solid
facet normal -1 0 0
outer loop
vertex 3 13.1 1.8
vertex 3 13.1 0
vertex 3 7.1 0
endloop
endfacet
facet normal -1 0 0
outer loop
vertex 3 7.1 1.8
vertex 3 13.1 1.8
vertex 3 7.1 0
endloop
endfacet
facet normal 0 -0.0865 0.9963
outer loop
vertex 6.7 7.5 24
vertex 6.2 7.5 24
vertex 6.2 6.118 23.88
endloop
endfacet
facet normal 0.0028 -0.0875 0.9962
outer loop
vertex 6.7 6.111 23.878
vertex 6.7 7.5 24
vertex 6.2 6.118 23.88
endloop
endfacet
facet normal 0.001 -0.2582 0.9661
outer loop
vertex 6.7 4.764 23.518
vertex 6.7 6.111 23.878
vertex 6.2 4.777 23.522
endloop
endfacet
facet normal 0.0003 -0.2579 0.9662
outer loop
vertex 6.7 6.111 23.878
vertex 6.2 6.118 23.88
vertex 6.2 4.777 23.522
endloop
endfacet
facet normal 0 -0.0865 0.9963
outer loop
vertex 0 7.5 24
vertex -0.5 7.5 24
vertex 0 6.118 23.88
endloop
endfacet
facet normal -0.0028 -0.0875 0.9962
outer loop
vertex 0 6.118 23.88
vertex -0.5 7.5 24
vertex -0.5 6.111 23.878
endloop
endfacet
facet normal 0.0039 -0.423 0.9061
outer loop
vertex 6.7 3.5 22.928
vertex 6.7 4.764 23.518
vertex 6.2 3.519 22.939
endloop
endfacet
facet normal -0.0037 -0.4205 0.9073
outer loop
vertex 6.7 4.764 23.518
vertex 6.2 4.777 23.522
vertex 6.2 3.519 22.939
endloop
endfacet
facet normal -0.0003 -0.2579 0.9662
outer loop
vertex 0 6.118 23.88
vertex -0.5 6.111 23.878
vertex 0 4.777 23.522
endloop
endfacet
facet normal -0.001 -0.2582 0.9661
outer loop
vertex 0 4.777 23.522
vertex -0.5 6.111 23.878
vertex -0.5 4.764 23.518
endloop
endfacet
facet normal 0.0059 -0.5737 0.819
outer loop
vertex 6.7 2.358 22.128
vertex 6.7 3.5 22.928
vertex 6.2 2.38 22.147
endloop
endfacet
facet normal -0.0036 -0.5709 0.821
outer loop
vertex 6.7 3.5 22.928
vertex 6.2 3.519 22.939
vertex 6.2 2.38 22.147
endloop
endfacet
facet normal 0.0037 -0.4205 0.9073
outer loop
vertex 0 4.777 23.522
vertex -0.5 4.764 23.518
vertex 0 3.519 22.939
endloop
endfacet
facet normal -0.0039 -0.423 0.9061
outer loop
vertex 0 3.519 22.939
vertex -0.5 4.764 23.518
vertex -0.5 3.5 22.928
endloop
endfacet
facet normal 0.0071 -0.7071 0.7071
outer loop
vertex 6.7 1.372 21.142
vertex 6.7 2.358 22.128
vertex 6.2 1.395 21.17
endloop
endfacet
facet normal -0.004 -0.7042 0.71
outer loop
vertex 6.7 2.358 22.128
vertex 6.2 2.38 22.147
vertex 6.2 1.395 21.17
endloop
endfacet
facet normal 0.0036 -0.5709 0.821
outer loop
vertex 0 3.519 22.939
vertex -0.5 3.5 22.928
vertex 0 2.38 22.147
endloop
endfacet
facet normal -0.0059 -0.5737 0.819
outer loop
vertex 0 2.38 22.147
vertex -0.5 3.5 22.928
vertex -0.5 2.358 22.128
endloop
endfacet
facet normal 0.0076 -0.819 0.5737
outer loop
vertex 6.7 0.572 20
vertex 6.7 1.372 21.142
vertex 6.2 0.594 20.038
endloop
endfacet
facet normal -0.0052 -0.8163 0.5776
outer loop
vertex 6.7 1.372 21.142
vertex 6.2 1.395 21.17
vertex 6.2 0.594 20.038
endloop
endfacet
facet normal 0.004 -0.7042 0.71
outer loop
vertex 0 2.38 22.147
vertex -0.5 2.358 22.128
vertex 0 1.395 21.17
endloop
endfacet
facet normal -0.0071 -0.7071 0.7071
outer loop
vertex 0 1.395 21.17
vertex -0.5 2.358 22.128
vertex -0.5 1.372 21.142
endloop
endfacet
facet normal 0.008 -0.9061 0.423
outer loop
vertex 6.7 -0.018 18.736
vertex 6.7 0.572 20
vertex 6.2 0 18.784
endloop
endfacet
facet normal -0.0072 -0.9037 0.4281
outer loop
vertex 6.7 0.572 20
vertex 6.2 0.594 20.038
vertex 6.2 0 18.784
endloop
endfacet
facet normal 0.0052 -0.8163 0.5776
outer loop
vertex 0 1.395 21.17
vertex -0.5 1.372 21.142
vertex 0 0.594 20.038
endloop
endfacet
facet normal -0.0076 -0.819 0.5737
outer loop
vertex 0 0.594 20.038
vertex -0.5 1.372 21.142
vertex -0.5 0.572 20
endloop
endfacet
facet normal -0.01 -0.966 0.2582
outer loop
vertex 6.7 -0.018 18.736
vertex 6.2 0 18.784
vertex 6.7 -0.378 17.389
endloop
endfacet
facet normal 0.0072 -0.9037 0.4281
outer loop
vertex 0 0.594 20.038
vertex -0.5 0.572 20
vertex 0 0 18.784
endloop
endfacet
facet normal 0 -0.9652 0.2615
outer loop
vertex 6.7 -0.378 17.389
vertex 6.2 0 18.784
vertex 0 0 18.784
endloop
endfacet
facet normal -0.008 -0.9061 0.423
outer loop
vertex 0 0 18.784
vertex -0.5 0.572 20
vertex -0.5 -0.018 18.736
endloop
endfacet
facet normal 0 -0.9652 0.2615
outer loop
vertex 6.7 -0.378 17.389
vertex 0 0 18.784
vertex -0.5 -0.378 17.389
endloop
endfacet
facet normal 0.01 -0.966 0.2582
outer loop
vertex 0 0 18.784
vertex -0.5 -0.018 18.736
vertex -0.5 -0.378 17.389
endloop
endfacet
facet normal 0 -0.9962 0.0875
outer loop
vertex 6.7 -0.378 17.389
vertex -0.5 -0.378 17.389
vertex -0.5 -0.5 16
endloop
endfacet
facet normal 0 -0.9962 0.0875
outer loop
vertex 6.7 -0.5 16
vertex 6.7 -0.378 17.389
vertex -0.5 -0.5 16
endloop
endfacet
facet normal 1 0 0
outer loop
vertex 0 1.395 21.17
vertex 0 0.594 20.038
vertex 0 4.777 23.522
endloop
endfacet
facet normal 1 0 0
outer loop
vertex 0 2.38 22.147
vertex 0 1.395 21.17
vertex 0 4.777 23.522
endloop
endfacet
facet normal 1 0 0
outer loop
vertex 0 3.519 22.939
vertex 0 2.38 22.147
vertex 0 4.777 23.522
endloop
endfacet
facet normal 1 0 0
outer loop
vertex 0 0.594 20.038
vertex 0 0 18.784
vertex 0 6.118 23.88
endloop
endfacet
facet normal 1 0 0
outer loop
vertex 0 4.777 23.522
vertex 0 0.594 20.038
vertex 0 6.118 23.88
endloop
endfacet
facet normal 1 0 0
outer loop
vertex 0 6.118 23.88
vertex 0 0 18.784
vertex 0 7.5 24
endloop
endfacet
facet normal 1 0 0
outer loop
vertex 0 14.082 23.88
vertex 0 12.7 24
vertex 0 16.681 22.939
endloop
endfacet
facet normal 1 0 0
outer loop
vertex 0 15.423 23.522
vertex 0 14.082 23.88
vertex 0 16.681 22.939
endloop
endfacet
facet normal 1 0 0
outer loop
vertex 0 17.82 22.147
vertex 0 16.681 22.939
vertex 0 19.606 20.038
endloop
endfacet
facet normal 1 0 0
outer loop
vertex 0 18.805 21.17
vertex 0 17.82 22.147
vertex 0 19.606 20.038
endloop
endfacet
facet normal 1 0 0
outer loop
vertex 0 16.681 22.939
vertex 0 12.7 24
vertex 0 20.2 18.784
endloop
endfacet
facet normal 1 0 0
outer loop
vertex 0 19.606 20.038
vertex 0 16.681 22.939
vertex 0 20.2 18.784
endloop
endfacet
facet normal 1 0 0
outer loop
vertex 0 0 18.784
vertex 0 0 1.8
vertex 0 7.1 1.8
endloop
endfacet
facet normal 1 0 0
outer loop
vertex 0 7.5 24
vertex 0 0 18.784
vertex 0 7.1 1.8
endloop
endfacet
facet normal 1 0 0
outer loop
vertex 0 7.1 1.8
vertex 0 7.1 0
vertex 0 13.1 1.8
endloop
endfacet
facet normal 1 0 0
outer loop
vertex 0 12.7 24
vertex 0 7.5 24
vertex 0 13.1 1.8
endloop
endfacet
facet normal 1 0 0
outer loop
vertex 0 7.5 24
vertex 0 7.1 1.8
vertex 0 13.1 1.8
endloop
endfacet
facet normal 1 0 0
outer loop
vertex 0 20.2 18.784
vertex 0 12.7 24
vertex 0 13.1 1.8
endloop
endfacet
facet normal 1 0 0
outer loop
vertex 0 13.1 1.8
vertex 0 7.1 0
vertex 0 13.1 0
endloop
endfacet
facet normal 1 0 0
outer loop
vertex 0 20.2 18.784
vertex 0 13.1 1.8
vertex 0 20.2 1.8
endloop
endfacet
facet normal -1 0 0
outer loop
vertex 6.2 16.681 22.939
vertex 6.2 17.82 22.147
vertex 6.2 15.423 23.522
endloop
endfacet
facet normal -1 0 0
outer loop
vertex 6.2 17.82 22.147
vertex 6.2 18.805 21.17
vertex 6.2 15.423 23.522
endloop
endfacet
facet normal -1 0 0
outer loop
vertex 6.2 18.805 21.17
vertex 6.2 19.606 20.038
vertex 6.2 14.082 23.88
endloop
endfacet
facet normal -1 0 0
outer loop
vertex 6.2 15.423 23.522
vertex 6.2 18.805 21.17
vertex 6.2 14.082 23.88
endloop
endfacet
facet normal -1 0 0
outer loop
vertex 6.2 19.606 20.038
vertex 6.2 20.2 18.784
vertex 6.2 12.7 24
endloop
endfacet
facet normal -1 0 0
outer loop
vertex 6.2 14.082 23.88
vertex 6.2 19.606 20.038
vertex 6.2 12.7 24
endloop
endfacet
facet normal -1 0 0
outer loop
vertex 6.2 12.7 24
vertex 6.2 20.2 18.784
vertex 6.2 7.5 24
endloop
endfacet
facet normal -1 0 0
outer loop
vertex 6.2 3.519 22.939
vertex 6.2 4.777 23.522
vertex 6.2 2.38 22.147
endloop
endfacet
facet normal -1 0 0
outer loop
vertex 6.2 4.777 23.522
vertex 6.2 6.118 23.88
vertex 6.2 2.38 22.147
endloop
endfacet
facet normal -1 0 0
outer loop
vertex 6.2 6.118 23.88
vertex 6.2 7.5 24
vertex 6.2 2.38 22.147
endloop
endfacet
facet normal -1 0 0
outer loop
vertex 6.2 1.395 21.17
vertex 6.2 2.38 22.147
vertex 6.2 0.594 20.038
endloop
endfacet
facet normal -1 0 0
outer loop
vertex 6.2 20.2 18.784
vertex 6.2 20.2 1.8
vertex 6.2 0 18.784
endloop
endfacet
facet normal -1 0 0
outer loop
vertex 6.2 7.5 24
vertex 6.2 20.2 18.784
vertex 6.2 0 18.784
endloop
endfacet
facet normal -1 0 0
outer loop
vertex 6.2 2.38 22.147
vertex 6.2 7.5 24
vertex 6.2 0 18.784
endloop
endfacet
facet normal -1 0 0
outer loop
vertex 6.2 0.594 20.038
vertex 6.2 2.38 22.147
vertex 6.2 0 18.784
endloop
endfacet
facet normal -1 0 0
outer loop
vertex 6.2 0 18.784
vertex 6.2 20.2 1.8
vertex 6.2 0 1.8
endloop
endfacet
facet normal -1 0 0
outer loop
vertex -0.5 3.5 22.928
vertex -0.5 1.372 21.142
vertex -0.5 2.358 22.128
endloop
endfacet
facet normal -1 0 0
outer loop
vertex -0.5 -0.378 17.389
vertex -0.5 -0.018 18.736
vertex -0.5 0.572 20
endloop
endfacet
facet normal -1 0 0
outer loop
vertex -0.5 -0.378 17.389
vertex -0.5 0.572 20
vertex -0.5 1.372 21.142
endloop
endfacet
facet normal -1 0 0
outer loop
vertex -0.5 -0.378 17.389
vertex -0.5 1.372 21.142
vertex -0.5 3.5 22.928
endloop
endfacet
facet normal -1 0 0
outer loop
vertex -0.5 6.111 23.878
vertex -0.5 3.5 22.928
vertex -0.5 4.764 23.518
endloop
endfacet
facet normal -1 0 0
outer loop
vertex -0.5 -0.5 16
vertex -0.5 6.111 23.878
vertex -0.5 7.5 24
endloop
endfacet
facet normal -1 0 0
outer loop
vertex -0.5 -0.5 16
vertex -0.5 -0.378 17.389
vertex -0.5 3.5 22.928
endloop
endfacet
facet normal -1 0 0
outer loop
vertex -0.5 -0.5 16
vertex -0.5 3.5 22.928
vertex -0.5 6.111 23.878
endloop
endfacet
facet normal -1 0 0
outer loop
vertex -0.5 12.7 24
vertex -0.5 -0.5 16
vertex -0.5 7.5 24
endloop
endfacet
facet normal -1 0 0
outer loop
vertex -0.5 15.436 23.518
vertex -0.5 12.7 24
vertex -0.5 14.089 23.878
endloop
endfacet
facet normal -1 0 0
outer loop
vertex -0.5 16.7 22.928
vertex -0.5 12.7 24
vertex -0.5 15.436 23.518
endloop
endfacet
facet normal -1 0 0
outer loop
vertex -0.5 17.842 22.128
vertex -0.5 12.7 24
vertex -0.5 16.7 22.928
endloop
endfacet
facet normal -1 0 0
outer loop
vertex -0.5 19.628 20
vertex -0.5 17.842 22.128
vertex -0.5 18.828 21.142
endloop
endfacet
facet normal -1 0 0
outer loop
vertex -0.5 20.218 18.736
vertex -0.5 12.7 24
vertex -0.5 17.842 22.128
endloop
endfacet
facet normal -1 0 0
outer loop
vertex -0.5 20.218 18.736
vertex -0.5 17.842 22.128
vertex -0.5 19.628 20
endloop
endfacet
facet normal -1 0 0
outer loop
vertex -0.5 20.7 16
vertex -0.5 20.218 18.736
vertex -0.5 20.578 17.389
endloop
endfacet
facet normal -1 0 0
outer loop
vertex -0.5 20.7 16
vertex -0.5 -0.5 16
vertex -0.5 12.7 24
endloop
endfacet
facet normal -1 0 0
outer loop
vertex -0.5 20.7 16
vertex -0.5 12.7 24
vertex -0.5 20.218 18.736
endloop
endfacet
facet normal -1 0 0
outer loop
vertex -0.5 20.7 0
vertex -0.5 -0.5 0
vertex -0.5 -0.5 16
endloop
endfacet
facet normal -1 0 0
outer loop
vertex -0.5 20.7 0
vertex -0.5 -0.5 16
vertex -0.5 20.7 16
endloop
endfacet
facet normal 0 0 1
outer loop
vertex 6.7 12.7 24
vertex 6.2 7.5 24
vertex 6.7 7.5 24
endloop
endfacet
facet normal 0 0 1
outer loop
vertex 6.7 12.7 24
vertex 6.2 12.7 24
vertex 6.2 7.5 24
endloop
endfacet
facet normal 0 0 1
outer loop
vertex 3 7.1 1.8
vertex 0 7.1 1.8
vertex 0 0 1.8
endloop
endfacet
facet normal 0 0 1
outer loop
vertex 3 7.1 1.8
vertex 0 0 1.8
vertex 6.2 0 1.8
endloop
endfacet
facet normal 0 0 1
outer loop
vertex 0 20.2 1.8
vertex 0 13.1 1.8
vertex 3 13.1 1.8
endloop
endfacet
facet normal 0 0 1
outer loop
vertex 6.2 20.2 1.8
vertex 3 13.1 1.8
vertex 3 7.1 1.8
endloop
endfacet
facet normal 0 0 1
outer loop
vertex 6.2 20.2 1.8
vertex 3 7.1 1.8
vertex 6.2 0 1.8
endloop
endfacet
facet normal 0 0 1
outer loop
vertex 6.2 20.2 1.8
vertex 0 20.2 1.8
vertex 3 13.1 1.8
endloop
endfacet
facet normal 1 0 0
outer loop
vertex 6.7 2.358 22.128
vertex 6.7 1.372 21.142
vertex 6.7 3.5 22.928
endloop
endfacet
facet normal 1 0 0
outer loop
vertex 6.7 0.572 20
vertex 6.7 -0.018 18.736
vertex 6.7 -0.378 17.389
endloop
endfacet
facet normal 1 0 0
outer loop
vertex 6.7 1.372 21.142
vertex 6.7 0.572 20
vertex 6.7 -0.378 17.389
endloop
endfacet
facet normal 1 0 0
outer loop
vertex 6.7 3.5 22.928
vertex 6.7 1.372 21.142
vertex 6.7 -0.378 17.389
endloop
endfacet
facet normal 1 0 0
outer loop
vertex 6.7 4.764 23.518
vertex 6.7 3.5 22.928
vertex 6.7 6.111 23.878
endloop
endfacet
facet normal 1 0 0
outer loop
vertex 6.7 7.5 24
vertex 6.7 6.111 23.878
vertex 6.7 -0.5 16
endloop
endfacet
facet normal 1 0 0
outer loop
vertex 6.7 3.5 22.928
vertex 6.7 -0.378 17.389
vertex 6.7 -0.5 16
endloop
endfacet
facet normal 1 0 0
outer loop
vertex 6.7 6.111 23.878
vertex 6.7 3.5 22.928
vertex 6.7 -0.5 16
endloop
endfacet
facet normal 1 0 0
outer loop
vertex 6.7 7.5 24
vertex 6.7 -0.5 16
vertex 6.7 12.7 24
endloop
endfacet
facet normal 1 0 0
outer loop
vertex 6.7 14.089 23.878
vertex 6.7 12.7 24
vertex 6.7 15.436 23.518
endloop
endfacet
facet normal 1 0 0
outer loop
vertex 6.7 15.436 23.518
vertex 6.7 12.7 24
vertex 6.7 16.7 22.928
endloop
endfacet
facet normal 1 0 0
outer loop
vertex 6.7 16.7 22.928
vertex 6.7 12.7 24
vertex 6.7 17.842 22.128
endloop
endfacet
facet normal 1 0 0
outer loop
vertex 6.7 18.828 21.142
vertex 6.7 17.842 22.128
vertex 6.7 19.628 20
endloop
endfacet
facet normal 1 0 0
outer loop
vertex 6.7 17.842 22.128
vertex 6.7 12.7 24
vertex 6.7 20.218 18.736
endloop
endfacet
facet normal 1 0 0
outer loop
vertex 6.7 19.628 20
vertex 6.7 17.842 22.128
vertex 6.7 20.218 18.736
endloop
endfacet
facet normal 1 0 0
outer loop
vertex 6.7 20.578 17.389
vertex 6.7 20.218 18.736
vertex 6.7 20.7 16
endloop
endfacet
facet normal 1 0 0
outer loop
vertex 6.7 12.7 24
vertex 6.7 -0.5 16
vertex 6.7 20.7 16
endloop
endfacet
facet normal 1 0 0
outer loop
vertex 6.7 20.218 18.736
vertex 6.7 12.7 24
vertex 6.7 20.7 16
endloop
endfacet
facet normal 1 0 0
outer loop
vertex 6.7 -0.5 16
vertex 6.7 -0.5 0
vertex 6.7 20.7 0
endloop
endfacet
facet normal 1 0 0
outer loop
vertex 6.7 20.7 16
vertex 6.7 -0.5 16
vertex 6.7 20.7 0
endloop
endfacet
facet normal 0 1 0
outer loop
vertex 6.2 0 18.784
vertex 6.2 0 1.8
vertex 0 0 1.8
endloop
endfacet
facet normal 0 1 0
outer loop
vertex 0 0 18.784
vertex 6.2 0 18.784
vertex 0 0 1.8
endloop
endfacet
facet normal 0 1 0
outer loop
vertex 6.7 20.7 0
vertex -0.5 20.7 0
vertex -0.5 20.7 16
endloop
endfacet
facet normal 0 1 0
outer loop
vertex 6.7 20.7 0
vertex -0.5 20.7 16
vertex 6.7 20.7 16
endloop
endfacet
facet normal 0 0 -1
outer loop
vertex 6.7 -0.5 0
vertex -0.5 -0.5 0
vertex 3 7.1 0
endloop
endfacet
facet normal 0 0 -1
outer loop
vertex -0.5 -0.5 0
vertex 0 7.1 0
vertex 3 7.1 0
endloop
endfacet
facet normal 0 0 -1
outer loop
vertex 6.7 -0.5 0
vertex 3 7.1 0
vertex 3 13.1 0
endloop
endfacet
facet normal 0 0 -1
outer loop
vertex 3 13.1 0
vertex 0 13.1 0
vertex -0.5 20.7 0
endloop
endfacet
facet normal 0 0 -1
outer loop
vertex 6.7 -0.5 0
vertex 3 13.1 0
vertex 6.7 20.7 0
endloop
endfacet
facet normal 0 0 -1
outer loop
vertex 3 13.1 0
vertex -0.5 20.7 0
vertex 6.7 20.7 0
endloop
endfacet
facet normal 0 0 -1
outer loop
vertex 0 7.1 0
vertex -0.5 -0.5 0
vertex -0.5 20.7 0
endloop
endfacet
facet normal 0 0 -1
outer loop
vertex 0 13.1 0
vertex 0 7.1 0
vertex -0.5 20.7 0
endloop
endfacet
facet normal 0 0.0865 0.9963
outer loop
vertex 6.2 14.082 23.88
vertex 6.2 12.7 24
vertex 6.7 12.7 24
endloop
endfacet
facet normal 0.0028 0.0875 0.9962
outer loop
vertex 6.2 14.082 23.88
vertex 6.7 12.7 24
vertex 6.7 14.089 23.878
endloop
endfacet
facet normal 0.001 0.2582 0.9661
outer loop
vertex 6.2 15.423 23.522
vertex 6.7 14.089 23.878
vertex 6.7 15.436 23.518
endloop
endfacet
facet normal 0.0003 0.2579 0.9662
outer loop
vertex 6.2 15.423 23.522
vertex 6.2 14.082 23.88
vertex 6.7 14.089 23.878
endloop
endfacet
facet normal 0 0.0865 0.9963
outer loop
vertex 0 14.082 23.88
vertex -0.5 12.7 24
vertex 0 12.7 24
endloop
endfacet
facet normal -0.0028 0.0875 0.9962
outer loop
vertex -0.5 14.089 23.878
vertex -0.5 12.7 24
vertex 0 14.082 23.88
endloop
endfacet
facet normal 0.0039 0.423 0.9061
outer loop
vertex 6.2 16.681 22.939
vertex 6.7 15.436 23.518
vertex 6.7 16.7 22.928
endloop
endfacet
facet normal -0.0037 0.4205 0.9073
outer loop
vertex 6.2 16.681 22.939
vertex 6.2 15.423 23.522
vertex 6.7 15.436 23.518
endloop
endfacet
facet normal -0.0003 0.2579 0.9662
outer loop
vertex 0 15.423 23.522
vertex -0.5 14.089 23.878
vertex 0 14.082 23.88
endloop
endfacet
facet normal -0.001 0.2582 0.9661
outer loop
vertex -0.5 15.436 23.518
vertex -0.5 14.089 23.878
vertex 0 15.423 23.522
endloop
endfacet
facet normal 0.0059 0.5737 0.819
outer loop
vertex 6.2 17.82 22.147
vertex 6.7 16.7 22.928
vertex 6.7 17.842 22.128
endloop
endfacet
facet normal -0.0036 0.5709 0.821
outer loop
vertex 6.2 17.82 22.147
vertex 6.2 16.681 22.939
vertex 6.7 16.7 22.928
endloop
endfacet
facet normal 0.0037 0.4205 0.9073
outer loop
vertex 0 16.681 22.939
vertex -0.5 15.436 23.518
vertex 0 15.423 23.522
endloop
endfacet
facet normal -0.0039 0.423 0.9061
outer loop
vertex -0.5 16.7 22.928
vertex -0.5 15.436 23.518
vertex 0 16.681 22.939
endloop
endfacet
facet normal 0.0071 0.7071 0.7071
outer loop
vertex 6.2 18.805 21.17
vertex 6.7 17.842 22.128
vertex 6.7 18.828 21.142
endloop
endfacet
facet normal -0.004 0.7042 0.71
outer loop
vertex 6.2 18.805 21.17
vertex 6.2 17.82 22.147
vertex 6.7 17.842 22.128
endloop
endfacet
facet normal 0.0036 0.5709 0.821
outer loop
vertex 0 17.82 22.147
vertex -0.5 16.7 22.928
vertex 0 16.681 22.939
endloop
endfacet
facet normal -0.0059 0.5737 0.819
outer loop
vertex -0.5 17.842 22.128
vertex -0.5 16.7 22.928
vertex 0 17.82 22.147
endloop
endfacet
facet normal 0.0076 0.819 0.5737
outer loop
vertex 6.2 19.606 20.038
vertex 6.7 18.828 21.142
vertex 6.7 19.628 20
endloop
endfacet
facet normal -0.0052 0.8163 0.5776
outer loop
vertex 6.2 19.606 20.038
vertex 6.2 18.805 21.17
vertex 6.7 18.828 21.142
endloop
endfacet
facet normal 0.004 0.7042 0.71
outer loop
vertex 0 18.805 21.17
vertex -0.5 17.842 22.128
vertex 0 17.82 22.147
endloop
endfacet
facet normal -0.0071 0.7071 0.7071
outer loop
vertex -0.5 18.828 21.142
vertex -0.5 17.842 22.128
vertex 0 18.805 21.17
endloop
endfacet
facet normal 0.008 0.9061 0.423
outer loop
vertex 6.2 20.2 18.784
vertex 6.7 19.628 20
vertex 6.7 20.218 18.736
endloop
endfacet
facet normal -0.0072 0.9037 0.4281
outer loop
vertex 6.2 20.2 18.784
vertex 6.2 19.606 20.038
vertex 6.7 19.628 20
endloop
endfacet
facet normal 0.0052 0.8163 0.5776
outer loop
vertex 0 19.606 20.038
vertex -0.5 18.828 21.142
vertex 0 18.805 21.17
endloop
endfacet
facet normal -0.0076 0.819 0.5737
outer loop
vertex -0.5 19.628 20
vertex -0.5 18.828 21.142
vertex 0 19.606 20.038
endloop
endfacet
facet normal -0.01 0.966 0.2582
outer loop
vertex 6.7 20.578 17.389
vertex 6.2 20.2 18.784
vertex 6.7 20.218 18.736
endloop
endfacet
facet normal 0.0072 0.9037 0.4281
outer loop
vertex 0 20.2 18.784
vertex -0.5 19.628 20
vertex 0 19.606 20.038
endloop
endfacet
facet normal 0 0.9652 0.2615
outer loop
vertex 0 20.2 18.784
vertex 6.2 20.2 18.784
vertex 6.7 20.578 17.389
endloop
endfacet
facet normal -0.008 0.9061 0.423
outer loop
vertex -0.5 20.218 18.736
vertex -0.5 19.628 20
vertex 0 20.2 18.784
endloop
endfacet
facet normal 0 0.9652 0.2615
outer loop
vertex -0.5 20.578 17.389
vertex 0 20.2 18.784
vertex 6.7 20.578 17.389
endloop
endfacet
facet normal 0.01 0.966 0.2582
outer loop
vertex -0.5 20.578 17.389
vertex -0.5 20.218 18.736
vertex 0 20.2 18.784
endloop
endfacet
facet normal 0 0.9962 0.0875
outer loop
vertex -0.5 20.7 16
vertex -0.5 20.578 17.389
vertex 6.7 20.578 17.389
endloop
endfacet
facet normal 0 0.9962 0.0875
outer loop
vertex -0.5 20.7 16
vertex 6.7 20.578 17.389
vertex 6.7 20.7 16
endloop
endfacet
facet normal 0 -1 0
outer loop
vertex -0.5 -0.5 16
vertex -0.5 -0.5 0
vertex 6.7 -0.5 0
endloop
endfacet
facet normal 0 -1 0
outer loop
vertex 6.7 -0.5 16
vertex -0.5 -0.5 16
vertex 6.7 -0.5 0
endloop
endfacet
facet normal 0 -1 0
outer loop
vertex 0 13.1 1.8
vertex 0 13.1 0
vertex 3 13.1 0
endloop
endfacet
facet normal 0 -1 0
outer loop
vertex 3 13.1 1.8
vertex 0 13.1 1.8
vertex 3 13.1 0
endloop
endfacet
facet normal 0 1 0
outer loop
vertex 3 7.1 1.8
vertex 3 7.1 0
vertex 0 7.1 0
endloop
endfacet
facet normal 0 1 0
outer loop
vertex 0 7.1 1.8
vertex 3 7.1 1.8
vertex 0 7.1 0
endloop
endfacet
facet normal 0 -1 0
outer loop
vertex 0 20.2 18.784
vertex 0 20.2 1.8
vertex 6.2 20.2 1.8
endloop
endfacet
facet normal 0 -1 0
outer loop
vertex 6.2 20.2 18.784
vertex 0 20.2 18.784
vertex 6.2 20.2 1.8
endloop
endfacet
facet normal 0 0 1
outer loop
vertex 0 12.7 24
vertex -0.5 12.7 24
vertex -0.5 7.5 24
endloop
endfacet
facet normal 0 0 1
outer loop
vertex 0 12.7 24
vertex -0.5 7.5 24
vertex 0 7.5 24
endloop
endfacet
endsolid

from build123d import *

# Parameters (mm, degrees)
F1_DEPTH    = 1.8
F0_W        = 7.2
F0_H        = 21.2
F2_DEPTH    = 24
F3_T1_DEPTH = 47.2


# Not quite as in the source:
# - a fillet or chamfer that OpenCascade refuses, or shapes differently, is made with other operations: its cross-section is extruded or revolved along the edge and cut away or added


with BuildPart() as f1:
    # F0 (on Top) → F1 (new body)
    with BuildSketch(Plane.XY):
        Polygon((0, 7.1), (0, 0), (6.2, 0), (6.2, 20.2), (0, 20.2), (0, 13.1), (3, 13.1), (3, 10.1), (3, 7.1), align=None)
    extrude(amount=F1_DEPTH)

    # F0 (on Top) → F2 (join)
    with BuildSketch(Plane.XY):
        with Locations((3.1, 10.1)):
            Rectangle(F0_W, F0_H)
        Polygon((6.2, 0), (0, 0), (0, 7.1), (0, 10.1), (0, 13.1), (0, 20.2), (6.2, 20.2), align=None, mode=Mode.SUBTRACT)
    extrude(amount=F2_DEPTH)

    # F3: fillet of radius 8 on 2 edges, made by hand

    # F3_s2 → F3_t1 (cut)
    with BuildSketch(Plane.YZ.offset(-20.5)):
        with BuildLine():
            ThreePointArc((7.5, 24), (1.8431457505, 21.6568542495), (-0.5, 16))
            Line((-0.5, 16), (-0.5, 24))
            Line((-0.5, 24), (7.5, 24))
        make_face()
        with BuildLine():
            ThreePointArc((12.7, 24), (18.3568542495, 21.6568542495), (20.7, 16))
            Line((20.7, 16), (20.7, 24))
            Line((20.7, 24), (12.7, 24))
        make_face()
    extrude(amount=F3_T1_DEPTH, mode=Mode.SUBTRACT)


solid = f1.part
